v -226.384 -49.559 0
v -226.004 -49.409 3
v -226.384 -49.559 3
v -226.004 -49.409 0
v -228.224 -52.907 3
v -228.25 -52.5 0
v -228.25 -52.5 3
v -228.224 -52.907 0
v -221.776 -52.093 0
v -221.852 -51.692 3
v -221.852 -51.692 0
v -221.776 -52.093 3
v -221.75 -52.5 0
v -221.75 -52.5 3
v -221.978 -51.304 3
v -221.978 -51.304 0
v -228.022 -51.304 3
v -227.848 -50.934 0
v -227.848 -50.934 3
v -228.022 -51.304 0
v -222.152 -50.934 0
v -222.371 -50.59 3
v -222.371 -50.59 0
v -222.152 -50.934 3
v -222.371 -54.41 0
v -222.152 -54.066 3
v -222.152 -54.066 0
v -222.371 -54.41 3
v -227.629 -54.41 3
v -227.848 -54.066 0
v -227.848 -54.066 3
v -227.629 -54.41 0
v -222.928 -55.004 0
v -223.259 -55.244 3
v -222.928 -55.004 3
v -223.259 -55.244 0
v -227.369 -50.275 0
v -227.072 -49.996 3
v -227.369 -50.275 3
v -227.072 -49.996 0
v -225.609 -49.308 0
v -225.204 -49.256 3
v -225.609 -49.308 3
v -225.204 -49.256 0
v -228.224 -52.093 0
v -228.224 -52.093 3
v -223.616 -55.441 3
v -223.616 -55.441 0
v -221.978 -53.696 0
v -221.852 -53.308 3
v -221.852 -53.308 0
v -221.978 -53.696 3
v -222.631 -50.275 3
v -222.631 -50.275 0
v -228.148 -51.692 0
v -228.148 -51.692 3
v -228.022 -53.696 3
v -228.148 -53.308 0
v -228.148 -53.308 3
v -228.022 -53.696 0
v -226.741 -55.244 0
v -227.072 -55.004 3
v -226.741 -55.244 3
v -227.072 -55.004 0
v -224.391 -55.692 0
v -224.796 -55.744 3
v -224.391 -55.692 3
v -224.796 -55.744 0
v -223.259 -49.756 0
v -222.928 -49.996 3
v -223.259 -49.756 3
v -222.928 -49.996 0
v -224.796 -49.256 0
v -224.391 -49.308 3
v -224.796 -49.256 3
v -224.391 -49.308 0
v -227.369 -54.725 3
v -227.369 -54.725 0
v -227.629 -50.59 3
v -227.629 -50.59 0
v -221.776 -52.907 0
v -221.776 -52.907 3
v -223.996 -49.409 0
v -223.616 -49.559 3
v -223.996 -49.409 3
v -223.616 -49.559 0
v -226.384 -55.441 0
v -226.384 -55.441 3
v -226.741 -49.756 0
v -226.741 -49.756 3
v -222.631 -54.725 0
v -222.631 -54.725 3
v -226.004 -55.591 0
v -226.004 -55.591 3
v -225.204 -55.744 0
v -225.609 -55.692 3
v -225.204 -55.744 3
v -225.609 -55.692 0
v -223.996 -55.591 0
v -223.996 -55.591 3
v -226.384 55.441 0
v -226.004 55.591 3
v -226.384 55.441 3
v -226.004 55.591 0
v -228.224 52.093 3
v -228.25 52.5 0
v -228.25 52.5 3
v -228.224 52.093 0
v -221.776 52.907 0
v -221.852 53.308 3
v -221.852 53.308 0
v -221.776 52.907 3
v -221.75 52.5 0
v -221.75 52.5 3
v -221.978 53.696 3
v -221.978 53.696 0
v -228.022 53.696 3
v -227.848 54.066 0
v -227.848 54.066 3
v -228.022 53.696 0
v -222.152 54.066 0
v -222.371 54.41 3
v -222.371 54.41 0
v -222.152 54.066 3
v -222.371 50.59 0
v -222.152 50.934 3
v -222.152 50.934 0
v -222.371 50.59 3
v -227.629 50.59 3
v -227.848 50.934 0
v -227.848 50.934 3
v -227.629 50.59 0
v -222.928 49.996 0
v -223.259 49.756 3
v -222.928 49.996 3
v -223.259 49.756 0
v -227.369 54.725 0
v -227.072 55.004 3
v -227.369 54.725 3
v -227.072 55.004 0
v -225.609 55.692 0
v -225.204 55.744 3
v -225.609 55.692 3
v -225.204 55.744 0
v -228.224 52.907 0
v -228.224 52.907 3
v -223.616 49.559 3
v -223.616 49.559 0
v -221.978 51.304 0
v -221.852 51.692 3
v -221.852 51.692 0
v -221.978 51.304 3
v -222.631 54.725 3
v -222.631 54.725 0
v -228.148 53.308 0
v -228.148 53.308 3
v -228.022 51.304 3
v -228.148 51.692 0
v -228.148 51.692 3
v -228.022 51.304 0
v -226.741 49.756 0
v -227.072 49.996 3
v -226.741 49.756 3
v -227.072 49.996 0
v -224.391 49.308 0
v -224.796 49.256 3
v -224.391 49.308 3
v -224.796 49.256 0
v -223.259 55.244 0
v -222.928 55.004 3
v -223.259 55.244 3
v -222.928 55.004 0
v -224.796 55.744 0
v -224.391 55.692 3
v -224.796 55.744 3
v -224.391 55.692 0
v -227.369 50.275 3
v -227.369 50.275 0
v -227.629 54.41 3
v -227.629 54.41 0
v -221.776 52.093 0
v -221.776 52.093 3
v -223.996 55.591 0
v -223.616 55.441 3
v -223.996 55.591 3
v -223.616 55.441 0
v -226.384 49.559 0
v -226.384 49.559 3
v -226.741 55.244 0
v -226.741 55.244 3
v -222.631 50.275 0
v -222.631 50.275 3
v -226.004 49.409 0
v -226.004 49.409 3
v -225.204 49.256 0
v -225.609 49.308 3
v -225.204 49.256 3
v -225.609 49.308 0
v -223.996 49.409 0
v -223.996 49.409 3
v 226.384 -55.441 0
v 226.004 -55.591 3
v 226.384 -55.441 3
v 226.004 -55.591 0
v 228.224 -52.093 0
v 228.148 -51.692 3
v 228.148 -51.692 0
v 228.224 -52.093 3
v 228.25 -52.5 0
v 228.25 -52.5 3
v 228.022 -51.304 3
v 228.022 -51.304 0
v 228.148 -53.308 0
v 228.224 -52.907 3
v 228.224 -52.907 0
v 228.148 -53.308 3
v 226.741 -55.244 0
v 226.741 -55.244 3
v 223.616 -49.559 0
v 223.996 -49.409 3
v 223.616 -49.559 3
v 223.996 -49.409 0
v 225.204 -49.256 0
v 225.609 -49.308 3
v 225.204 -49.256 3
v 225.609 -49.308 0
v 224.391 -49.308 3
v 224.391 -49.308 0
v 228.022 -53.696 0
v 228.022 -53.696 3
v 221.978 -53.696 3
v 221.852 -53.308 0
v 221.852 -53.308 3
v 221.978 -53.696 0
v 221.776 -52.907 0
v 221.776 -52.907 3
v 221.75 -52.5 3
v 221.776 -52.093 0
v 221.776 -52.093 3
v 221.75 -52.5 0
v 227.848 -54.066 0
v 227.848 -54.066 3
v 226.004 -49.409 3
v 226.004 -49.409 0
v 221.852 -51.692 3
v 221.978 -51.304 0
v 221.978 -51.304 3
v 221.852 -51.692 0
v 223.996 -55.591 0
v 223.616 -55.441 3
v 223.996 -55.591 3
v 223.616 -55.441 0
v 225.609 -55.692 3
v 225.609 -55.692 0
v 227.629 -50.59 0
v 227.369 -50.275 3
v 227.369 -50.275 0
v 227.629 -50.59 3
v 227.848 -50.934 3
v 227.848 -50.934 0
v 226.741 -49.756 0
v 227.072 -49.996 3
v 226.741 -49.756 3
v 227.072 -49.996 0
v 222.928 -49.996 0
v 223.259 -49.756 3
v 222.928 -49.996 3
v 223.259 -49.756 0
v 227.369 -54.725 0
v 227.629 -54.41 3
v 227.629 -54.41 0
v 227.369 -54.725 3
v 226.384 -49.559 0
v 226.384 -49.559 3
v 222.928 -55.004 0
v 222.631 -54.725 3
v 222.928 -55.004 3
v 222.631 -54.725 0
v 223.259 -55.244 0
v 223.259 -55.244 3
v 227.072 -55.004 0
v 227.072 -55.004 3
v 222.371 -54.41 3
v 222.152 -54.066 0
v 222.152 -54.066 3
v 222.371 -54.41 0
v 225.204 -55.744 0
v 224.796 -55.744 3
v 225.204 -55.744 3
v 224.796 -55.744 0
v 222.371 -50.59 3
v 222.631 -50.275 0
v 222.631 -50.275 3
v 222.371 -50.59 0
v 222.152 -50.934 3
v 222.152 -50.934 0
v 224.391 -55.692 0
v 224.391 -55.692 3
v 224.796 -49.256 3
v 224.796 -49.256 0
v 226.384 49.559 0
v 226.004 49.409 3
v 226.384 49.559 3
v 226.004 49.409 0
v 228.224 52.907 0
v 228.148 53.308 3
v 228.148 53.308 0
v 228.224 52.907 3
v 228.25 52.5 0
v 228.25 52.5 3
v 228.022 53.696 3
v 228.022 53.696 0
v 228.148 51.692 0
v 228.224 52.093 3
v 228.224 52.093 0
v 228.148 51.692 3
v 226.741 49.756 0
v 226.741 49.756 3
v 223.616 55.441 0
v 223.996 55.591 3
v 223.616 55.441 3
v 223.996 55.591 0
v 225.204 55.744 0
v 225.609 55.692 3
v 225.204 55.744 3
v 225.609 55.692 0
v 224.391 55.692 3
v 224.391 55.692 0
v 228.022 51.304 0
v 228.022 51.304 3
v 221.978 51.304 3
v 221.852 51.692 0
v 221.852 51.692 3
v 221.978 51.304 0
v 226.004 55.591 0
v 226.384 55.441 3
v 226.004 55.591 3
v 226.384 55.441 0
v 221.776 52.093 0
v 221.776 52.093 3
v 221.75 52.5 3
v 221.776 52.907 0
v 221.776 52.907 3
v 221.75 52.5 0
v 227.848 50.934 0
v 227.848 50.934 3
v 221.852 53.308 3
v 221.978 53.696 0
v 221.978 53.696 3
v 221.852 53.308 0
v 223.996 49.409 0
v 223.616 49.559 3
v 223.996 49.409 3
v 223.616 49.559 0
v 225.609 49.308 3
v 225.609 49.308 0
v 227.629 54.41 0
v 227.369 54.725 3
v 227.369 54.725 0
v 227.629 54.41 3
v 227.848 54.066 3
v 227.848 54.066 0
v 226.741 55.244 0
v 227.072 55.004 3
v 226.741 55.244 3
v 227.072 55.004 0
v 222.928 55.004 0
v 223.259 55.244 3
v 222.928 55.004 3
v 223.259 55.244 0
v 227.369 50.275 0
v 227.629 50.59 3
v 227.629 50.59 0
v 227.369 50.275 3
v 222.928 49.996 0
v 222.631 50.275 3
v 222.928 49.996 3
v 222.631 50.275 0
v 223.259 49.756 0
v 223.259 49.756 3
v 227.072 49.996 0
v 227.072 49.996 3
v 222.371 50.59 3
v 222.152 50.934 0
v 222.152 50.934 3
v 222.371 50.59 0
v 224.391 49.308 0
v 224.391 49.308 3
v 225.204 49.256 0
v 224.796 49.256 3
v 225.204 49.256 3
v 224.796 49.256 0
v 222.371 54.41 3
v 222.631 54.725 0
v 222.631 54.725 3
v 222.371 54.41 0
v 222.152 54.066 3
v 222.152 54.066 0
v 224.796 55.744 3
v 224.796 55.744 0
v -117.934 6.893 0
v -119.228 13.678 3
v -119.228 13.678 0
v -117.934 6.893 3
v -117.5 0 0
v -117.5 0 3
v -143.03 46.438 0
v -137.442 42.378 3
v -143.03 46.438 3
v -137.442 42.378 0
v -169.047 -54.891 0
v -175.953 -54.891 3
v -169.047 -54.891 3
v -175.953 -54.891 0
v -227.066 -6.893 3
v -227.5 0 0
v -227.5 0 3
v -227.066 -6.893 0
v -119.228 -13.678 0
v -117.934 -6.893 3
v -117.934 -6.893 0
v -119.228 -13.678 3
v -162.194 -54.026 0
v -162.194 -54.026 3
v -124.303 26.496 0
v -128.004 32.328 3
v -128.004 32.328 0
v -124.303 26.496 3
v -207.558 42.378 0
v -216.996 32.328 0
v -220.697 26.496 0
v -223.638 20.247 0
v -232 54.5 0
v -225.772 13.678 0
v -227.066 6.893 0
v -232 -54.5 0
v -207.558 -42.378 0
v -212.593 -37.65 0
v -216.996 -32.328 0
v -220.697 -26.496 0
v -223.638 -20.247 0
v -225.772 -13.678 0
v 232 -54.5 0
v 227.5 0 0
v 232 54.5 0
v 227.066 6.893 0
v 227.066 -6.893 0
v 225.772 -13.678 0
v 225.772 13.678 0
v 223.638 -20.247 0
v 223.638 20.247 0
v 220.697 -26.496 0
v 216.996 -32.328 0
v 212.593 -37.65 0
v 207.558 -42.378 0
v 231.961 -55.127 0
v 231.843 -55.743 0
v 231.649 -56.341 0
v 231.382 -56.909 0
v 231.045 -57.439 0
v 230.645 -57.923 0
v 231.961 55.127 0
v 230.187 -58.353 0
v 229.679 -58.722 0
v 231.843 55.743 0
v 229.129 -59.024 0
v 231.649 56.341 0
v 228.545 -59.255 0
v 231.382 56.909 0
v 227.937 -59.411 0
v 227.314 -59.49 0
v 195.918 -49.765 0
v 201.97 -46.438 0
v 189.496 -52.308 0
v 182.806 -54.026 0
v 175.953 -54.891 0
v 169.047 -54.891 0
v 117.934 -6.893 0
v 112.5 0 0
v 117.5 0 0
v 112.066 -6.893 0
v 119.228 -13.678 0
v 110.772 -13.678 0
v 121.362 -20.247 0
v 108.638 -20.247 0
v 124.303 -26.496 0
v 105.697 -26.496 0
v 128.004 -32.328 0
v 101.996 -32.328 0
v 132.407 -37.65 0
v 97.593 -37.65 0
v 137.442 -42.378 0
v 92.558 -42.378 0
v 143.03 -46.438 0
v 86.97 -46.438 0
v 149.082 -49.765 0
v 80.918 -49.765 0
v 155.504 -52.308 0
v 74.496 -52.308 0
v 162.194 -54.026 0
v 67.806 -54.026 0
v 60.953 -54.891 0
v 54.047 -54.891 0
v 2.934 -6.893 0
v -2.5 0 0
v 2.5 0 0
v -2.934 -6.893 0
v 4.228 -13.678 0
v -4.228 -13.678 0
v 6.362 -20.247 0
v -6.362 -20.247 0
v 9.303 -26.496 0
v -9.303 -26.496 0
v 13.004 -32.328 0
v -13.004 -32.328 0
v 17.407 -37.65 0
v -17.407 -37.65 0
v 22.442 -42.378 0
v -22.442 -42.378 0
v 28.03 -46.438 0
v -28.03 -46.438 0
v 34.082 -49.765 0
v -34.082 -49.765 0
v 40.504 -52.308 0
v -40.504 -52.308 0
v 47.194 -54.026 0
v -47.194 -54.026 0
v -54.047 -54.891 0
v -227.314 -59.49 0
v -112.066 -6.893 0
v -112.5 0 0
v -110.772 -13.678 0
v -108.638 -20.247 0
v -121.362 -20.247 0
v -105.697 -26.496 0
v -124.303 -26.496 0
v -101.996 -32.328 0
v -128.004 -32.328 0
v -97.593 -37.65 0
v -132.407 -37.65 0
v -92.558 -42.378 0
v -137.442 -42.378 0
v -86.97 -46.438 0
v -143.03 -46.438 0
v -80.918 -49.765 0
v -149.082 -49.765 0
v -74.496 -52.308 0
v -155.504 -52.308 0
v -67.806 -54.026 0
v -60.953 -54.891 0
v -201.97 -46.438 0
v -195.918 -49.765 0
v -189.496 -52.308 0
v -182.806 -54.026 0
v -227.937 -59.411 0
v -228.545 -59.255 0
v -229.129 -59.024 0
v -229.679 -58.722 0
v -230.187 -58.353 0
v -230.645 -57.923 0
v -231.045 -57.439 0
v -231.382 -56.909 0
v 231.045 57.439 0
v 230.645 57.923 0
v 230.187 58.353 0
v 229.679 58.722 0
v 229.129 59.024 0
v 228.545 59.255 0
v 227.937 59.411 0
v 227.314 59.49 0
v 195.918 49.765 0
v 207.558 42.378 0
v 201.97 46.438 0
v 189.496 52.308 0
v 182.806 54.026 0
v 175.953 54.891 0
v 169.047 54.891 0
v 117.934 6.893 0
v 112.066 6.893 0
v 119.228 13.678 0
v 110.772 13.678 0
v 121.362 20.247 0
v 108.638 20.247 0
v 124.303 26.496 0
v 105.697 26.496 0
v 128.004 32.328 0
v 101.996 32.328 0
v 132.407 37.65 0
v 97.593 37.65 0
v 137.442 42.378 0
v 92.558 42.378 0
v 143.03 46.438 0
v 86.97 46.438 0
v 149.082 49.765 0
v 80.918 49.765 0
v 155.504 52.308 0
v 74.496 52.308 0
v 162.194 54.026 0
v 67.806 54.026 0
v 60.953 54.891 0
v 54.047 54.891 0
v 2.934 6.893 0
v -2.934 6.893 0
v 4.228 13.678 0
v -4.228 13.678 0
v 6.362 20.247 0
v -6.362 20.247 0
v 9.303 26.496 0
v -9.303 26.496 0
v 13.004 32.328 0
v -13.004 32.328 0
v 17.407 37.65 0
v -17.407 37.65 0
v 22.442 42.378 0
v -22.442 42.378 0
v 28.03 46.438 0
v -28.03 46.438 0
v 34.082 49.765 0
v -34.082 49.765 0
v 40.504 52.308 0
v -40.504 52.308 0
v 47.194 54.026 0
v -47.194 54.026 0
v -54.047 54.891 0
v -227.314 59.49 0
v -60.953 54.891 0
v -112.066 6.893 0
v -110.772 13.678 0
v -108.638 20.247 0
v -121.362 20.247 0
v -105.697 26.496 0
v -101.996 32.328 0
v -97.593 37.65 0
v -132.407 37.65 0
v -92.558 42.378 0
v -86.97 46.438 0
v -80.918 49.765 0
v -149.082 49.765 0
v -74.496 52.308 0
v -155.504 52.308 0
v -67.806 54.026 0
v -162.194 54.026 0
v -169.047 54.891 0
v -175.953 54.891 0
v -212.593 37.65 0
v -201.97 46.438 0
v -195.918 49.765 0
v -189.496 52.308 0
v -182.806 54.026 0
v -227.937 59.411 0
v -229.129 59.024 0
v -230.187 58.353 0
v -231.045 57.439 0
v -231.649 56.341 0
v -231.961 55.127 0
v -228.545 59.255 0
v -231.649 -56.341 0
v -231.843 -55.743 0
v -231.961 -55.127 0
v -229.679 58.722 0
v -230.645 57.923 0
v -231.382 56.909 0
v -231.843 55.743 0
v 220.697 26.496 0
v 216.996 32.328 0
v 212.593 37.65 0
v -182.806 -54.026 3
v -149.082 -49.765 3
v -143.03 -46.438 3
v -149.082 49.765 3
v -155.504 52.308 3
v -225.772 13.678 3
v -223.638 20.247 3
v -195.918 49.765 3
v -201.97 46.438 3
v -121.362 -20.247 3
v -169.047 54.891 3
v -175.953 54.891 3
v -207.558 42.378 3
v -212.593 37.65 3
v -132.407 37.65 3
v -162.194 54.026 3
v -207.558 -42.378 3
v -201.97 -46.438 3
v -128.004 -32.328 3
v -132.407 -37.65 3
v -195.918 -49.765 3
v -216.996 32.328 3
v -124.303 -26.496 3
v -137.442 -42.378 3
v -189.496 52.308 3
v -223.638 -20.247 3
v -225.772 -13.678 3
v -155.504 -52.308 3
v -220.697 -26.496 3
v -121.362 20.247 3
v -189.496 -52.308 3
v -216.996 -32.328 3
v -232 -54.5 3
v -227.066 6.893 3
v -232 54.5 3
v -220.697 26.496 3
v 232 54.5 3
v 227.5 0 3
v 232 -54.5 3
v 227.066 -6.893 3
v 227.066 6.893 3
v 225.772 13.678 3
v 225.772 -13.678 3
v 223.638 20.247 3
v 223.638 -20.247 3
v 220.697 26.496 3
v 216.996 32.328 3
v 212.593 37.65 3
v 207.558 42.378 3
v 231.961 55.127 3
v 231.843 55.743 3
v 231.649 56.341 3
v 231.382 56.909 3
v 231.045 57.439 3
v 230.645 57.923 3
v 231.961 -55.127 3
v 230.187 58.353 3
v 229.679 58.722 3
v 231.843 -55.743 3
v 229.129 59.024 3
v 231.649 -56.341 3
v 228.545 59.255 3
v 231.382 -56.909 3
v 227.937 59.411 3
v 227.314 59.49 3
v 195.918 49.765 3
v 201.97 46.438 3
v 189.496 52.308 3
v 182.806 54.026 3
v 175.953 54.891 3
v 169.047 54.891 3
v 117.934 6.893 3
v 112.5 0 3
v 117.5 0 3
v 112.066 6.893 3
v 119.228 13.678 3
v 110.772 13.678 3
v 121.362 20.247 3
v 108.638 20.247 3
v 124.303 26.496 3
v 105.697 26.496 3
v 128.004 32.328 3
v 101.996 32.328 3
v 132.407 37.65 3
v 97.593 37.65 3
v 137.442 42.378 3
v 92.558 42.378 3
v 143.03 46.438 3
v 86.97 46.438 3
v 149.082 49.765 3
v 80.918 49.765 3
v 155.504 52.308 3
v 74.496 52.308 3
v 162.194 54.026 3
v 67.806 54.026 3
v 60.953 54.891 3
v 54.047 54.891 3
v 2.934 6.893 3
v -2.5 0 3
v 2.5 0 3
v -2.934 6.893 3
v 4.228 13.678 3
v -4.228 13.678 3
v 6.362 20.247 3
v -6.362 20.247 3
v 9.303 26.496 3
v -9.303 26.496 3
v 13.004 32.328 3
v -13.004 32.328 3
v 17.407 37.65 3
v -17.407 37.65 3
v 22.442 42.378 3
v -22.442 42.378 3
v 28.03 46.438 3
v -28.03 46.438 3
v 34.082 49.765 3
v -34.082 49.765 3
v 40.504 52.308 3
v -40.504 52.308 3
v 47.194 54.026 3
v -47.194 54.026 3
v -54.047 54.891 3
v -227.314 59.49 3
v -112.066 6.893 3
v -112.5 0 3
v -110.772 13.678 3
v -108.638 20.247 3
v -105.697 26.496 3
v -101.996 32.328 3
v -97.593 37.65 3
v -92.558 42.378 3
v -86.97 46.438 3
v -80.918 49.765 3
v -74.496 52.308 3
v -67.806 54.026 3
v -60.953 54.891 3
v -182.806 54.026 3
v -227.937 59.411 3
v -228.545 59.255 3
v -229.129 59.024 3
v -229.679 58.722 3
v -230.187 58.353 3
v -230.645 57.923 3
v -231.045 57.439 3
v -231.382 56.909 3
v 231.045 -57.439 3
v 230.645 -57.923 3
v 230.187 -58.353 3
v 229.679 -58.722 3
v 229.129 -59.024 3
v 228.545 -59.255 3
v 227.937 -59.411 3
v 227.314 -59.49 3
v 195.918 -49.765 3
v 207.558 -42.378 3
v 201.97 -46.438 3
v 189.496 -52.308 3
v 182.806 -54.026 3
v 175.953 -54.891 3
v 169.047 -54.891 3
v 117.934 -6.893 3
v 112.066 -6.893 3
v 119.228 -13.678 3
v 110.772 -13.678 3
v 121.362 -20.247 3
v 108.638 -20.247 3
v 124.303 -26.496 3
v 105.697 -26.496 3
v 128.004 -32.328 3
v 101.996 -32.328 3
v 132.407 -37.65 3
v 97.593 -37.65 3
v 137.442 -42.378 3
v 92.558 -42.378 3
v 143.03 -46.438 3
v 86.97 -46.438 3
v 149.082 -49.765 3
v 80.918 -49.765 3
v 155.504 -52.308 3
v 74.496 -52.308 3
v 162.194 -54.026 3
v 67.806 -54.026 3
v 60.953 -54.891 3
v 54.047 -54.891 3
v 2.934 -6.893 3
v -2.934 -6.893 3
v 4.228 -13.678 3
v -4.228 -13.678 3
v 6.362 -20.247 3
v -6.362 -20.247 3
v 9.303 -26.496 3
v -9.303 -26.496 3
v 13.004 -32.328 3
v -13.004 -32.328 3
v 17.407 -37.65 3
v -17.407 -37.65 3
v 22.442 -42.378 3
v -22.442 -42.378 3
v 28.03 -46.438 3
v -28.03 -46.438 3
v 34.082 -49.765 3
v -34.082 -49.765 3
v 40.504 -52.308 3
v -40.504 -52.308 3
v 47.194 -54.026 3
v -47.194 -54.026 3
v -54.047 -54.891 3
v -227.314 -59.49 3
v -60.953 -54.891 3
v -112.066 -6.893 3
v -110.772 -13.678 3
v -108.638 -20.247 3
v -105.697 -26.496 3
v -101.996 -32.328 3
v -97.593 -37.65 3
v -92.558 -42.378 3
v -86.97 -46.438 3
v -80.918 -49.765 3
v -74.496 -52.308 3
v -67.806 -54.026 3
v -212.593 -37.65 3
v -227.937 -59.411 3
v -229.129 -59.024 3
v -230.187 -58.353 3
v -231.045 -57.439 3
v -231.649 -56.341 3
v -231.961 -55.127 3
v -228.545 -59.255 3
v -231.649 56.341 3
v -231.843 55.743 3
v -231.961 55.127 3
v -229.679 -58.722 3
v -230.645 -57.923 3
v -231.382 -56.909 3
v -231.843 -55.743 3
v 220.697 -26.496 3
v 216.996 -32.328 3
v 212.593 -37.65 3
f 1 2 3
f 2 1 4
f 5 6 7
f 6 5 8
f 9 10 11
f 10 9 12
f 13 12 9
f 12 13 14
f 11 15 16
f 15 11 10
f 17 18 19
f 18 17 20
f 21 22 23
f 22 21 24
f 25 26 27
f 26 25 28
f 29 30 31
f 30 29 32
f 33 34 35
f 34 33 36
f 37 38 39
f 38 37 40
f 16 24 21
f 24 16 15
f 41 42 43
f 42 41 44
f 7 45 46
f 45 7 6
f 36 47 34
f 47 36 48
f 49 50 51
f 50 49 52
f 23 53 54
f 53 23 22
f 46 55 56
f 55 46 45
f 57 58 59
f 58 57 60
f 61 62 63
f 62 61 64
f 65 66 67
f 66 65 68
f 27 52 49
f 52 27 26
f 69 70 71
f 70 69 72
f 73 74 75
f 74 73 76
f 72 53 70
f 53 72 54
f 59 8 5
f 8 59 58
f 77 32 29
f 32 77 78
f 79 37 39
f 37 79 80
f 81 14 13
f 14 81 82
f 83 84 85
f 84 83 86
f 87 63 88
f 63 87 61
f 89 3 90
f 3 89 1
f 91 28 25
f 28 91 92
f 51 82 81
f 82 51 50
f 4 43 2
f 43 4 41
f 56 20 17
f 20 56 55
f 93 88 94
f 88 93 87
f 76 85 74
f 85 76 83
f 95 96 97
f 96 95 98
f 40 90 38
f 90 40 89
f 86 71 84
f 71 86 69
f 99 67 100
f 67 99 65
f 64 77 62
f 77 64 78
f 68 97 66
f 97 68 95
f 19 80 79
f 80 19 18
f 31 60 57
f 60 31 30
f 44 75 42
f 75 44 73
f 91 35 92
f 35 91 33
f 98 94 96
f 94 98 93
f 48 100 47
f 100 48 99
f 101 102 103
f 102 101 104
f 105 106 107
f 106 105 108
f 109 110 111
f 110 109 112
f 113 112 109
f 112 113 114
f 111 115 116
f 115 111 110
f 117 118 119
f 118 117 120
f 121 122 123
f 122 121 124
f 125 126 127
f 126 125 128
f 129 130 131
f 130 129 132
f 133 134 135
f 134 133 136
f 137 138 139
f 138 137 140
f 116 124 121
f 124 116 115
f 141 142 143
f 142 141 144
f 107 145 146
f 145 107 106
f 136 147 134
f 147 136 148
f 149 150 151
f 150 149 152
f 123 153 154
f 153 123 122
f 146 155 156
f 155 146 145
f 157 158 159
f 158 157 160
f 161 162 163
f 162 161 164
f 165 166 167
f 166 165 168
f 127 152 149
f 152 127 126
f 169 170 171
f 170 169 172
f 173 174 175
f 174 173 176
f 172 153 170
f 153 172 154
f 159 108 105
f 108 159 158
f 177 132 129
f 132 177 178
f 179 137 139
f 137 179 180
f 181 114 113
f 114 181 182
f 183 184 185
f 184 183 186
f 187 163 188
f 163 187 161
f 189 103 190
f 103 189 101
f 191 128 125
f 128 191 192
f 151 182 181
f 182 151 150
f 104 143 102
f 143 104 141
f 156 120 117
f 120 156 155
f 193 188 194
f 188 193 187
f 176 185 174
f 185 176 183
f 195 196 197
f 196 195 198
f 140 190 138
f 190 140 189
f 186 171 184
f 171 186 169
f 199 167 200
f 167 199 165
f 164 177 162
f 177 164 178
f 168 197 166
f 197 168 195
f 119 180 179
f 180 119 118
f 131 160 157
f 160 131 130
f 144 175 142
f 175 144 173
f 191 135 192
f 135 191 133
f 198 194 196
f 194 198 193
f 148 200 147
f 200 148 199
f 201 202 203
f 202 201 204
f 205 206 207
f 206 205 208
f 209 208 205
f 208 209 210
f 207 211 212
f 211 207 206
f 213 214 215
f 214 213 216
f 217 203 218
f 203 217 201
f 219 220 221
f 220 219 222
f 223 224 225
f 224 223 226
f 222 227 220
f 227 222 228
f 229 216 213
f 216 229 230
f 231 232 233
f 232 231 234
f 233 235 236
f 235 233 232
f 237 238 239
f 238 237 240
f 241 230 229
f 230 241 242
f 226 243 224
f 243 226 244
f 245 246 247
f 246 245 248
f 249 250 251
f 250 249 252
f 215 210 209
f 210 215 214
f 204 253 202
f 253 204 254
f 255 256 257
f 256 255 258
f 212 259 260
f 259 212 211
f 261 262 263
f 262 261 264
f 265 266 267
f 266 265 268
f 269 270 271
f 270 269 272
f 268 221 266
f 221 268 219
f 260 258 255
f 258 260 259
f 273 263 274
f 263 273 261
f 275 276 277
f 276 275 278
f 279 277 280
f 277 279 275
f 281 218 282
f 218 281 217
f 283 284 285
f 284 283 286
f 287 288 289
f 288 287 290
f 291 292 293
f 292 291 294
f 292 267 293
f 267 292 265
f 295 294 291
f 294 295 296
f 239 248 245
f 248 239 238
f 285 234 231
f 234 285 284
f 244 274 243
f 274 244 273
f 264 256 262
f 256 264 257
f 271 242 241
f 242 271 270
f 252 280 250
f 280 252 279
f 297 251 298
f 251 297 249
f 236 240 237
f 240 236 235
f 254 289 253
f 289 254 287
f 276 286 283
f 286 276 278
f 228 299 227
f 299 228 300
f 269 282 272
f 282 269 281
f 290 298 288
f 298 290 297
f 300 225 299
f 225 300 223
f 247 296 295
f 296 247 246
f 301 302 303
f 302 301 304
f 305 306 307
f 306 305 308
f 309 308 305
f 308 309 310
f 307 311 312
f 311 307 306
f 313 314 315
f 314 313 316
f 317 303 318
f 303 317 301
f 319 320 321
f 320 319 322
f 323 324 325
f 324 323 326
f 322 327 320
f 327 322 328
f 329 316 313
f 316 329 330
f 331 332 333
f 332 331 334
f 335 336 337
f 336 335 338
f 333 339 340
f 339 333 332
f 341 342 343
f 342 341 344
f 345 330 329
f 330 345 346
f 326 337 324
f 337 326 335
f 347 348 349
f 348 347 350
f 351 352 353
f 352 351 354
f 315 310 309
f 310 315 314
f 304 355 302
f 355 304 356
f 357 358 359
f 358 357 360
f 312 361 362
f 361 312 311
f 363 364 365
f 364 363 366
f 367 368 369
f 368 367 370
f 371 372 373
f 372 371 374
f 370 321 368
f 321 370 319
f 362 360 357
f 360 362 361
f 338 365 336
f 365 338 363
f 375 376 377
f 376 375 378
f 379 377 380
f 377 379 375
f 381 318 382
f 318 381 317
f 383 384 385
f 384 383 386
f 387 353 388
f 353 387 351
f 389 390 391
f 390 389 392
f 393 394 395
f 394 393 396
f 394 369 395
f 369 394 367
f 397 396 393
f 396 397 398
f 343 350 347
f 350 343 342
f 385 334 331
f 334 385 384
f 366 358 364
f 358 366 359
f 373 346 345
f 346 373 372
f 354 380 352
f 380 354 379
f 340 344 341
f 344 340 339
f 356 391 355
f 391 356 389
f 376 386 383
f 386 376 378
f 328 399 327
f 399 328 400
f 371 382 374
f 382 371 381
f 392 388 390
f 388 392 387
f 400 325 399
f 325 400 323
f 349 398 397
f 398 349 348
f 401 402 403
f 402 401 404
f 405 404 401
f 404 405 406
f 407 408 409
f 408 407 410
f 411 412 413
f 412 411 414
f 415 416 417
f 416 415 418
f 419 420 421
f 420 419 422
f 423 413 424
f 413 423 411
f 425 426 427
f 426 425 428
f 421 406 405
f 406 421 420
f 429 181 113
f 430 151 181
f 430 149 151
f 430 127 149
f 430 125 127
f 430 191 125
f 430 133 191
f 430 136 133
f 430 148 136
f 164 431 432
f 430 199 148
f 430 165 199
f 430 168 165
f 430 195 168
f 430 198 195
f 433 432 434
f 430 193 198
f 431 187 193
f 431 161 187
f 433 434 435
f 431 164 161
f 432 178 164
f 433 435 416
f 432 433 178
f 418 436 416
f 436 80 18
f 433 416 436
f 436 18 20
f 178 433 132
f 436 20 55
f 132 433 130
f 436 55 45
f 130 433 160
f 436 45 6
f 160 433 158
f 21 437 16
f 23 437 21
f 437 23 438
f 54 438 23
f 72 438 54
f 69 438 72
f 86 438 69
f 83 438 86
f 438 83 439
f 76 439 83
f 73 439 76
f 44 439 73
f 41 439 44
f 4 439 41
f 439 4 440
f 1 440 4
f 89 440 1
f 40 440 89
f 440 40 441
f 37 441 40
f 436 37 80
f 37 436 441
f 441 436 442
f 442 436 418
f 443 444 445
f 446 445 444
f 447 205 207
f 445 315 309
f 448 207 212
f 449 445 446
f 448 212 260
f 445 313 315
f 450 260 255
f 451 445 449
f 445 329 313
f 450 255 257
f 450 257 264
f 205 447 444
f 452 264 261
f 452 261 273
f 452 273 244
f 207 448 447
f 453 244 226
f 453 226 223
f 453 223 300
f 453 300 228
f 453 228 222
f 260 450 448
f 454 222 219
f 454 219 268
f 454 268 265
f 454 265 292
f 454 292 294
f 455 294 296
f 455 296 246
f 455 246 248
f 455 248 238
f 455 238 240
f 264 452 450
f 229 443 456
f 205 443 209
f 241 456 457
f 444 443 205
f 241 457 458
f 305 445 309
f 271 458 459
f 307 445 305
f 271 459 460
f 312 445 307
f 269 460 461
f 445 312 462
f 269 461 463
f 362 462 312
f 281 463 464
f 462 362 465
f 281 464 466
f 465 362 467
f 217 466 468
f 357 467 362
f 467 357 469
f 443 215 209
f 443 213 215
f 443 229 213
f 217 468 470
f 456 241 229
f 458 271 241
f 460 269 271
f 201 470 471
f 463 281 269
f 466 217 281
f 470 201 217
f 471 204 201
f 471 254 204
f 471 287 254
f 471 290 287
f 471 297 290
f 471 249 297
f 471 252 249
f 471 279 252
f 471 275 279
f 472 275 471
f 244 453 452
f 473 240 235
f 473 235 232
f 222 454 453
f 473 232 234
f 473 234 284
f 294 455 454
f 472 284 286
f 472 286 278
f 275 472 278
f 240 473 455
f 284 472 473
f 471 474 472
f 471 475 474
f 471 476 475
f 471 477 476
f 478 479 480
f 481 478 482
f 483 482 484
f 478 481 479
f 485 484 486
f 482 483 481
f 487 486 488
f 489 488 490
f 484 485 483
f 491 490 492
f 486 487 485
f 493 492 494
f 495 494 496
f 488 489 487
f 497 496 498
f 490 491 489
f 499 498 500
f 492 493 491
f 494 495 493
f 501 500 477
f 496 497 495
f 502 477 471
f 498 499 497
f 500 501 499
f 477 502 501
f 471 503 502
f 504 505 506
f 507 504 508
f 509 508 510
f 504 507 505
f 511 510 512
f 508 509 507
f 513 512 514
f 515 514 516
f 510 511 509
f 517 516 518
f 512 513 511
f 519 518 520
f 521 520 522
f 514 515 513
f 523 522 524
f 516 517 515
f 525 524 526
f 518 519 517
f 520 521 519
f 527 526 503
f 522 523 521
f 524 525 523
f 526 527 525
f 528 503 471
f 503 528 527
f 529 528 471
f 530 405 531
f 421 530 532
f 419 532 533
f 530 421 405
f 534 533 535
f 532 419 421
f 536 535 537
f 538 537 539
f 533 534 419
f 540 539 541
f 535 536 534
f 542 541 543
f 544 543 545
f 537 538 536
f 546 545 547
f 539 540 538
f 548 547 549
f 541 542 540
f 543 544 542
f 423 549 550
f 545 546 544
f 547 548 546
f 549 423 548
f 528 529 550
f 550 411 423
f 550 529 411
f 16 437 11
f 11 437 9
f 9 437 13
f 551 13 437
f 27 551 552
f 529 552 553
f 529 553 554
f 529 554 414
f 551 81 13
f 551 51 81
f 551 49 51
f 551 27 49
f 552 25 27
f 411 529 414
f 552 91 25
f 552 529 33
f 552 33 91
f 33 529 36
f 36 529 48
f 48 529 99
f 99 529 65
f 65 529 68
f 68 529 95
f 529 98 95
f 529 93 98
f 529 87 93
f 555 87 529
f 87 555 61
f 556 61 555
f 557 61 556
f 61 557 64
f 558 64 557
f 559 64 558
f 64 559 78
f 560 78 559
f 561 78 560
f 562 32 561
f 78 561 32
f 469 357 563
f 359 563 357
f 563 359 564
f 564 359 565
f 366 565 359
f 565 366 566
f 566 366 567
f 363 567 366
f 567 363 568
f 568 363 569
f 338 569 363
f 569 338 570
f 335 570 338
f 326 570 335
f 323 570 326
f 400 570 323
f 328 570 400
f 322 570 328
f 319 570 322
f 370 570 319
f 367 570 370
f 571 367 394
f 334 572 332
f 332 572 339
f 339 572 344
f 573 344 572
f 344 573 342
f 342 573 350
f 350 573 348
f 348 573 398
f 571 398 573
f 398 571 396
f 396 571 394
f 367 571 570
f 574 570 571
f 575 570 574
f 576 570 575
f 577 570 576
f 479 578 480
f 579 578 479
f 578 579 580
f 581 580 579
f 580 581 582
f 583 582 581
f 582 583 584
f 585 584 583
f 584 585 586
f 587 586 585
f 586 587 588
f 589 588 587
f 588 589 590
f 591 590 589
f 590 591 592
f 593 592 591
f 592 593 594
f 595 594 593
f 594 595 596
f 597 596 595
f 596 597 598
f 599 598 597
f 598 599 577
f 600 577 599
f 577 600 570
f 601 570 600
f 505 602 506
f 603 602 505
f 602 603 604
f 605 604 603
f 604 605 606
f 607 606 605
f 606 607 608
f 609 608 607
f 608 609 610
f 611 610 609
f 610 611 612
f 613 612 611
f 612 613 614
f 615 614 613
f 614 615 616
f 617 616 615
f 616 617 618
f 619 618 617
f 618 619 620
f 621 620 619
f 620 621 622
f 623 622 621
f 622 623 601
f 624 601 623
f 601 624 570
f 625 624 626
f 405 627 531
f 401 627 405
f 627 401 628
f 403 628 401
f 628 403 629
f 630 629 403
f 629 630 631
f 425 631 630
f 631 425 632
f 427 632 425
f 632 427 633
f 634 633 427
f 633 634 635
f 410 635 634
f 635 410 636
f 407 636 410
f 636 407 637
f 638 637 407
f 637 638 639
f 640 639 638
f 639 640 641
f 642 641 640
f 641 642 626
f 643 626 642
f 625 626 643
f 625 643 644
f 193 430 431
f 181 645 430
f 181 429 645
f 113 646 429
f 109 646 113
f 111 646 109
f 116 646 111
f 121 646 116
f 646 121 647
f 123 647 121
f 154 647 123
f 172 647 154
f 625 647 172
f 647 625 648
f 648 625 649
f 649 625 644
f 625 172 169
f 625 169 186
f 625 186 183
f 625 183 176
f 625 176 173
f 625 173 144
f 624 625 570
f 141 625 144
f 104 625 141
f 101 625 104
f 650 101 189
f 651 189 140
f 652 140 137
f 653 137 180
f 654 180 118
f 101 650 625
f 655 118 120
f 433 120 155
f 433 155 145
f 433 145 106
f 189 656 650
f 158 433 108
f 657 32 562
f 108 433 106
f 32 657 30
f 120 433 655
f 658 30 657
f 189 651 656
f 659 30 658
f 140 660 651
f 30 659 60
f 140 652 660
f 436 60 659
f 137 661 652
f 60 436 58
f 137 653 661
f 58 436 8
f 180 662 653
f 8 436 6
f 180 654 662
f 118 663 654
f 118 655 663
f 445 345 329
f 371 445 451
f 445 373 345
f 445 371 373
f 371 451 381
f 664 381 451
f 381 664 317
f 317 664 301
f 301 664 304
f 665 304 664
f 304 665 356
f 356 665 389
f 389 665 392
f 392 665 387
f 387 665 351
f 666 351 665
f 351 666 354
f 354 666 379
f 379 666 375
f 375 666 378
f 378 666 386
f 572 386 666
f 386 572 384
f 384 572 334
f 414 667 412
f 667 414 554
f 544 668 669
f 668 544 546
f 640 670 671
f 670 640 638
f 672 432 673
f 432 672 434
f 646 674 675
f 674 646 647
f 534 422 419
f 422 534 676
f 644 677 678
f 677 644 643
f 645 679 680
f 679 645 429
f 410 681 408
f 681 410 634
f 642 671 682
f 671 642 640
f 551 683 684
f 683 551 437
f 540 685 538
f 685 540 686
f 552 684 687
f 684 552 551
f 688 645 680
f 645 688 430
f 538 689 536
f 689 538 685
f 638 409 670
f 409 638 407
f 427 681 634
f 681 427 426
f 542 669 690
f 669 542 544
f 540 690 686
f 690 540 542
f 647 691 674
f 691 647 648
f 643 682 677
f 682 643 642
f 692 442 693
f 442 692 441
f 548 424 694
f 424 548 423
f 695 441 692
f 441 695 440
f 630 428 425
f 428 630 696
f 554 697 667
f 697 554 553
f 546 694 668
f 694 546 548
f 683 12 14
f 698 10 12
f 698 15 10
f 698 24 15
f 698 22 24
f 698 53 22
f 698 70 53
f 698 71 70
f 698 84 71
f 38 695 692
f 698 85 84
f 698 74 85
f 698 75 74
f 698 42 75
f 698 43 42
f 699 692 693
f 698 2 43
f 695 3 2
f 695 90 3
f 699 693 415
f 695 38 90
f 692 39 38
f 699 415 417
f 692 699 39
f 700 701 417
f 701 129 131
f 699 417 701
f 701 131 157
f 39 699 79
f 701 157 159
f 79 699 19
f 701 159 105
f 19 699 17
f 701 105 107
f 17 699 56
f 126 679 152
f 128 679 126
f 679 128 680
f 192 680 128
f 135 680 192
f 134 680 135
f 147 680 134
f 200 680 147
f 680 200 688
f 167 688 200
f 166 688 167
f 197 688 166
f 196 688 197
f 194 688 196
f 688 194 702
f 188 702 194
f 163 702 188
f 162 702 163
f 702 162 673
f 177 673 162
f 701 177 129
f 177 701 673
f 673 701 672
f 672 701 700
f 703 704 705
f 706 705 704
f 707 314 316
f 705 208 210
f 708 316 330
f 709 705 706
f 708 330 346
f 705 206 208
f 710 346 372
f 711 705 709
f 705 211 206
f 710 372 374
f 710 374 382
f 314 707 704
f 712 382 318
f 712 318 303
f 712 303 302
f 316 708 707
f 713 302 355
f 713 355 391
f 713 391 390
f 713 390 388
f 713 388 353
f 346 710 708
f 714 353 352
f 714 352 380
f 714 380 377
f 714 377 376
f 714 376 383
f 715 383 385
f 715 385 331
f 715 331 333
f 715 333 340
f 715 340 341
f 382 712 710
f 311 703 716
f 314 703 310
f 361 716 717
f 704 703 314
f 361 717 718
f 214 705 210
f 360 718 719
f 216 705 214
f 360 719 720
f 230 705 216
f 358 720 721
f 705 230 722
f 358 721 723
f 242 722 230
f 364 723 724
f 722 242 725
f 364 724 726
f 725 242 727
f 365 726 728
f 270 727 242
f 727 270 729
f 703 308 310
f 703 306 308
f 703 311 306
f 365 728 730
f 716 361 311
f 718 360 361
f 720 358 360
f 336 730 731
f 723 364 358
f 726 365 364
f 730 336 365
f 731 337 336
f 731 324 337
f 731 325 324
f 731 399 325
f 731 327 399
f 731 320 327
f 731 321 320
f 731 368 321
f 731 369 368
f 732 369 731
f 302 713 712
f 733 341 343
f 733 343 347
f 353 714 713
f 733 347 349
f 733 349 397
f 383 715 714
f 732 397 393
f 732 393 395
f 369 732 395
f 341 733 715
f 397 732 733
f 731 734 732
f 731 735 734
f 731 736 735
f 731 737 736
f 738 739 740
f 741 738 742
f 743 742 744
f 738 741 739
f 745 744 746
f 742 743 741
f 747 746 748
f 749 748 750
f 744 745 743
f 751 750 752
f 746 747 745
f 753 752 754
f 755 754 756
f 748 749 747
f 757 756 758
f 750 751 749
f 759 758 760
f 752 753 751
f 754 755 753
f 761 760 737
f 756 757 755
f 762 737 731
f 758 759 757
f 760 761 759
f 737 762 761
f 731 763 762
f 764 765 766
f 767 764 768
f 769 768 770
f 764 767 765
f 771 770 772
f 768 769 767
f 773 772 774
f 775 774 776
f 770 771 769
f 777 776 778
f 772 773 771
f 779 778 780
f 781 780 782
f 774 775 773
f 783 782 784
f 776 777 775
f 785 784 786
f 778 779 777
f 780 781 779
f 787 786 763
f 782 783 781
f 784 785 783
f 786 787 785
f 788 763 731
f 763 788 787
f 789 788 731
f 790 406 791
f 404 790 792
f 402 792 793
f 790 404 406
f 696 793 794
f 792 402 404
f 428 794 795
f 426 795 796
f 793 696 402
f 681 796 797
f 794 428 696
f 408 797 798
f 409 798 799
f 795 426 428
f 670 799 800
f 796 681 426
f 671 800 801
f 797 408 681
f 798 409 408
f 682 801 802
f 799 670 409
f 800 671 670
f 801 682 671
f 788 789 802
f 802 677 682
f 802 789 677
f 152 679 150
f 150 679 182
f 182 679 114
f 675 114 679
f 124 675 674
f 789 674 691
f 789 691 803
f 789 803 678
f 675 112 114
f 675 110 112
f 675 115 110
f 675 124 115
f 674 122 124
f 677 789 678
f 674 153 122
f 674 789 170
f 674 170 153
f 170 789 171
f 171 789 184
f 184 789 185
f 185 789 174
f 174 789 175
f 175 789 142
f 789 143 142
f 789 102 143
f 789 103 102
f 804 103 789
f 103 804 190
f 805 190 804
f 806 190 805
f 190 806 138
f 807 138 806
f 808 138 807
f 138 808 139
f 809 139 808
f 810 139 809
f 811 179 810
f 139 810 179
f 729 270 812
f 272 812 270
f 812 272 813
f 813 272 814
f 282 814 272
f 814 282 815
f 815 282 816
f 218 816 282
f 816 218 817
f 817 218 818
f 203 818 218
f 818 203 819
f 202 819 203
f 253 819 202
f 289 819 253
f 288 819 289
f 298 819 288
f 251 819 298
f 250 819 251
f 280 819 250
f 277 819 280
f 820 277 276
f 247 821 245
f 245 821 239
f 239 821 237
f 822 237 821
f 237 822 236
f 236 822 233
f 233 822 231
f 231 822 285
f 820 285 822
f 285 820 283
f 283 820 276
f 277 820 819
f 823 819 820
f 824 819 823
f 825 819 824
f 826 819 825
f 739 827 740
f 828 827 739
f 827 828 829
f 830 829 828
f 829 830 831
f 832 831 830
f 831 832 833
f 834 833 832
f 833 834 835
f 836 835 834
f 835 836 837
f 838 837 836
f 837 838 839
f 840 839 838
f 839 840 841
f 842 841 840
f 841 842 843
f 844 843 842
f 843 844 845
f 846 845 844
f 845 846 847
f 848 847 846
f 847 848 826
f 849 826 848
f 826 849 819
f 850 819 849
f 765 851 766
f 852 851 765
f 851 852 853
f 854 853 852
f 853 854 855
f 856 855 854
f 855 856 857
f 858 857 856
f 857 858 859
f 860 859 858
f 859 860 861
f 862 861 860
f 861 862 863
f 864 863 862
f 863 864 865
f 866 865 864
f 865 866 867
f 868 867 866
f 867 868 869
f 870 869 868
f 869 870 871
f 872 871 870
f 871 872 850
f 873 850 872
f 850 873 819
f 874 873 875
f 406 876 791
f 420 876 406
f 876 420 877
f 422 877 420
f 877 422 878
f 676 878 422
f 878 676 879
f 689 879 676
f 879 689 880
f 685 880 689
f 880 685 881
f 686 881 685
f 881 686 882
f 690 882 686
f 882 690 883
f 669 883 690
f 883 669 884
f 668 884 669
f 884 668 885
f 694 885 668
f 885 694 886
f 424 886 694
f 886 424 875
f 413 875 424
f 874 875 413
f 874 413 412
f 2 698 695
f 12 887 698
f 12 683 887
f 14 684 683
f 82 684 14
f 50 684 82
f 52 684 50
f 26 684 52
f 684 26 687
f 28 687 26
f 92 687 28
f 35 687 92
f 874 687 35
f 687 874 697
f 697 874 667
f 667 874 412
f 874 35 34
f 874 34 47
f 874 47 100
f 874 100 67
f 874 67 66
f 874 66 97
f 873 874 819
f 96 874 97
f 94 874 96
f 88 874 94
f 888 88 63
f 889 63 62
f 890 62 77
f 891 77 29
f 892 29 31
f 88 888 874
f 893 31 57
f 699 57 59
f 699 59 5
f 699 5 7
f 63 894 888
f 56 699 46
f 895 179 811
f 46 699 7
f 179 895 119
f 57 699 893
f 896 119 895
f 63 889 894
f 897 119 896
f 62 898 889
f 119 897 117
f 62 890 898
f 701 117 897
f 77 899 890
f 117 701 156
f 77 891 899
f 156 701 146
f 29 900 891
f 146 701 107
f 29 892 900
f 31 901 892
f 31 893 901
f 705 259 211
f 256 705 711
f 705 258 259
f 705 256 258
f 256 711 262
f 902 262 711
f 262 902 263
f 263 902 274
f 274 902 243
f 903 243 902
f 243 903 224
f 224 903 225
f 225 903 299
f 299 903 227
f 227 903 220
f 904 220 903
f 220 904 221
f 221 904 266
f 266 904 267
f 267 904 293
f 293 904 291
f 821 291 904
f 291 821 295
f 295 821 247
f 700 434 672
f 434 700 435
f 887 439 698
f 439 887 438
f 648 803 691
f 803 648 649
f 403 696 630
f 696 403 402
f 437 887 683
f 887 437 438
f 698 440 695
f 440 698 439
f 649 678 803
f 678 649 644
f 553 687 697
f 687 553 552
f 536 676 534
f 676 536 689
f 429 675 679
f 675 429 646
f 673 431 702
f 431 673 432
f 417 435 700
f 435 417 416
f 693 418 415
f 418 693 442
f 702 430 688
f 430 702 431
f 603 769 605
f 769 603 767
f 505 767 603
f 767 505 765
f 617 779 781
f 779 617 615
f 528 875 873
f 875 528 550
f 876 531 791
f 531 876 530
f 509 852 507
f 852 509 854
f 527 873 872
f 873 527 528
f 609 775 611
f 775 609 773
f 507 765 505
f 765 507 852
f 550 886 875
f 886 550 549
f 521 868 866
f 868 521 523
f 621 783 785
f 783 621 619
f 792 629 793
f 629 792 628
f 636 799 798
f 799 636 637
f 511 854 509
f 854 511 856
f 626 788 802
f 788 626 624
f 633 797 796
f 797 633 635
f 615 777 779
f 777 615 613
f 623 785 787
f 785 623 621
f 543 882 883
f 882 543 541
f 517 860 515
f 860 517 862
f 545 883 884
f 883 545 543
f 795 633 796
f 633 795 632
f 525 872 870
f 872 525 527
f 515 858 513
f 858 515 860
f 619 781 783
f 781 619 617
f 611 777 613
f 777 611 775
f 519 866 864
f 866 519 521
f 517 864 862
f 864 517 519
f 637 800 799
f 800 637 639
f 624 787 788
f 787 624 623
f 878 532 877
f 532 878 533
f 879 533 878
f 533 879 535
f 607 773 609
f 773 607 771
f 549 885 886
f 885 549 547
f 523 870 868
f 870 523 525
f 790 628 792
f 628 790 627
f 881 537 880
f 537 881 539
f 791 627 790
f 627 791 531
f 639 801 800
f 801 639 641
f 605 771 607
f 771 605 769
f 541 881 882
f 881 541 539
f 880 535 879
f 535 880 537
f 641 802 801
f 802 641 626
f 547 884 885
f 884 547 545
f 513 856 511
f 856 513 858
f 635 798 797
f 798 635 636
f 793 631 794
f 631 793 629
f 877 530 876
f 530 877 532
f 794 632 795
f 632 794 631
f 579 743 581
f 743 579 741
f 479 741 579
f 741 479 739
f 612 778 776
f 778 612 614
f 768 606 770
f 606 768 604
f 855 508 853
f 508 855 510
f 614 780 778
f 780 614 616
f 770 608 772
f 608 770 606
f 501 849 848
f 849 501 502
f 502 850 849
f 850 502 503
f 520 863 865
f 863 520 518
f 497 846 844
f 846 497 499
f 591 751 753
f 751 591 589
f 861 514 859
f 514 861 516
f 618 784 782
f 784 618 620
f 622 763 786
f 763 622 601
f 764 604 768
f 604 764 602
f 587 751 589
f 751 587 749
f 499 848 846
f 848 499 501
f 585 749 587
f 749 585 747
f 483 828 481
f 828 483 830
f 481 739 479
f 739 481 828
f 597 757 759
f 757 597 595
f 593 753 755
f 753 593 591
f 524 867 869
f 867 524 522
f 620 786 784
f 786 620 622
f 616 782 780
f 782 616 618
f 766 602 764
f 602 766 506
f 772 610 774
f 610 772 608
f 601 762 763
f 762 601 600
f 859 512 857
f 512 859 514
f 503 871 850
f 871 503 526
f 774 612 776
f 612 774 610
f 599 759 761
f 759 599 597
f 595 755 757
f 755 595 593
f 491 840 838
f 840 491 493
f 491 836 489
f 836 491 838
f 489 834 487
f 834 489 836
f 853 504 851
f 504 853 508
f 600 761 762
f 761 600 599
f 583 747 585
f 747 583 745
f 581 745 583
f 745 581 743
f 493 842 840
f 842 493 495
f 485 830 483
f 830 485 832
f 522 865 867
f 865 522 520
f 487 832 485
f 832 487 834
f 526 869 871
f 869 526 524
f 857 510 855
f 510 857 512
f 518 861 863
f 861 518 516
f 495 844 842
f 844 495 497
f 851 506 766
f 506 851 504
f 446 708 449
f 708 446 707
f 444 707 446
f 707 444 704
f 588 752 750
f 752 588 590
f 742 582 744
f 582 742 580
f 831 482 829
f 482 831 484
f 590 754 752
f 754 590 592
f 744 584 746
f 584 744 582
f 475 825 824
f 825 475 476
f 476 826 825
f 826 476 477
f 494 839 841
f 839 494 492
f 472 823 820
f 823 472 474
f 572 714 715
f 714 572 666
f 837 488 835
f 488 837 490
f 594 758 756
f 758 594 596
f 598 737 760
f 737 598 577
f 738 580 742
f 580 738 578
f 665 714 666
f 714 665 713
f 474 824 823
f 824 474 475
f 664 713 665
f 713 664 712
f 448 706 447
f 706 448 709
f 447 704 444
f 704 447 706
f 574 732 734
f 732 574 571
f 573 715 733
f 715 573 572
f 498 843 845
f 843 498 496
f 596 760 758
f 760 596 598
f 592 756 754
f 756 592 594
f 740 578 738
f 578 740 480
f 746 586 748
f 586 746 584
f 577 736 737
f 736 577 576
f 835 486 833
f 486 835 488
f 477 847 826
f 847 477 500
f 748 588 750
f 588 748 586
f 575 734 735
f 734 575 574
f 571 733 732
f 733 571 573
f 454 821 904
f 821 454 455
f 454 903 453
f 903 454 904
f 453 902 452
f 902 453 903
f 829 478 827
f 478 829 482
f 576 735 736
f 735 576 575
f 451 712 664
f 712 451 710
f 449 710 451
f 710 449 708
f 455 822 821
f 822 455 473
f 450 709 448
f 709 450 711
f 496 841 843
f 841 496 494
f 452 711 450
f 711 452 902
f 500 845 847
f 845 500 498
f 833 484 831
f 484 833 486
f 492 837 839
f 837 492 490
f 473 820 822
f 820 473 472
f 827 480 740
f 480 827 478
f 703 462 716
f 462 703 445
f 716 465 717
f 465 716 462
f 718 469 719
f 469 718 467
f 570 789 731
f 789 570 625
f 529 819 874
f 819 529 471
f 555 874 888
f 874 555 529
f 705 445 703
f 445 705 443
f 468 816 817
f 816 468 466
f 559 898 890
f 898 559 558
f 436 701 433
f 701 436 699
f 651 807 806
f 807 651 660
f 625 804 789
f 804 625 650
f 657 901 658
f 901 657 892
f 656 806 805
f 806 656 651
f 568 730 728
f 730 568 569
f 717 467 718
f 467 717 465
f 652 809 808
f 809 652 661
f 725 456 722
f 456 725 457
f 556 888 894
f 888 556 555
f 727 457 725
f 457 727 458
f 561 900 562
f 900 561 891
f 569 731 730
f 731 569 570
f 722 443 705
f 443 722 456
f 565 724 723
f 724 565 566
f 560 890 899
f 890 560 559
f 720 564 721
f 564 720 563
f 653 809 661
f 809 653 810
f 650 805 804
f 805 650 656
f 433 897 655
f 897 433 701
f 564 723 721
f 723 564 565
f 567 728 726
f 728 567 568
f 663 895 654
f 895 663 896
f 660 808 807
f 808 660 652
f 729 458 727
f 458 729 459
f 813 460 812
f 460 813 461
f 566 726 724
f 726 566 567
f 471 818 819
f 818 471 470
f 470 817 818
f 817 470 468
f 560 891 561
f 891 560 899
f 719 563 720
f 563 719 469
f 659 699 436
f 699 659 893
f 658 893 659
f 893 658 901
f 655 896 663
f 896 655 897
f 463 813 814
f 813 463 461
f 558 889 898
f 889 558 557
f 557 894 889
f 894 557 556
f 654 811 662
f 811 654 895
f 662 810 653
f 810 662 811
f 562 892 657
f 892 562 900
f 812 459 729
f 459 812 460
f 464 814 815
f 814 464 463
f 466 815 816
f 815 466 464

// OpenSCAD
$fn = 50;

difference() {
	union() {
		hull() {
			translate(v = [-227.0, 54.5, 0]) {
				cylinder(h = 3, r = 5);
			}
			translate(v = [227.0, 54.5, 0]) {
				cylinder(h = 3, r = 5);
			}
			translate(v = [-227.0, -54.5, 0]) {
				cylinder(h = 3, r = 5);
			}
			translate(v = [227.0, -54.5, 0]) {
				cylinder(h = 3, r = 5);
			}
		}
	}
	union() {
		translate(v = [-225.0, -52.5, -100.0]) {
			cylinder(h = 200, r = 3.25);
		}
		translate(v = [-225.0, 52.5, -100.0]) {
			cylinder(h = 200, r = 3.25);
		}
		translate(v = [225.0, -52.5, -100.0]) {
			cylinder(h = 200, r = 3.25);
		}
		translate(v = [225.0, 52.5, -100.0]) {
			cylinder(h = 200, r = 3.25);
		}
		translate(v = [-225.0, -52.5, -100.0]) {
			cylinder(h = 200, r = 1.8);
		}
		translate(v = [-225.0, 52.5, -100.0]) {
			cylinder(h = 200, r = 1.8);
		}
		translate(v = [225.0, -52.5, -100.0]) {
			cylinder(h = 200, r = 1.8);
		}
		translate(v = [225.0, 52.5, -100.0]) {
			cylinder(h = 200, r = 1.8);
		}
		translate(v = [-172.5, 0, 0.0]) {
			cylinder(h = 3, r = 55.0);
		}
		translate(v = [-57.5, 0, 0.0]) {
			cylinder(h = 3, r = 55.0);
		}
		translate(v = [57.5, 0, 0.0]) {
			cylinder(h = 3, r = 55.0);
		}
		translate(v = [172.5, 0, 0.0]) {
			cylinder(h = 3, r = 55.0);
		}
	}
}
